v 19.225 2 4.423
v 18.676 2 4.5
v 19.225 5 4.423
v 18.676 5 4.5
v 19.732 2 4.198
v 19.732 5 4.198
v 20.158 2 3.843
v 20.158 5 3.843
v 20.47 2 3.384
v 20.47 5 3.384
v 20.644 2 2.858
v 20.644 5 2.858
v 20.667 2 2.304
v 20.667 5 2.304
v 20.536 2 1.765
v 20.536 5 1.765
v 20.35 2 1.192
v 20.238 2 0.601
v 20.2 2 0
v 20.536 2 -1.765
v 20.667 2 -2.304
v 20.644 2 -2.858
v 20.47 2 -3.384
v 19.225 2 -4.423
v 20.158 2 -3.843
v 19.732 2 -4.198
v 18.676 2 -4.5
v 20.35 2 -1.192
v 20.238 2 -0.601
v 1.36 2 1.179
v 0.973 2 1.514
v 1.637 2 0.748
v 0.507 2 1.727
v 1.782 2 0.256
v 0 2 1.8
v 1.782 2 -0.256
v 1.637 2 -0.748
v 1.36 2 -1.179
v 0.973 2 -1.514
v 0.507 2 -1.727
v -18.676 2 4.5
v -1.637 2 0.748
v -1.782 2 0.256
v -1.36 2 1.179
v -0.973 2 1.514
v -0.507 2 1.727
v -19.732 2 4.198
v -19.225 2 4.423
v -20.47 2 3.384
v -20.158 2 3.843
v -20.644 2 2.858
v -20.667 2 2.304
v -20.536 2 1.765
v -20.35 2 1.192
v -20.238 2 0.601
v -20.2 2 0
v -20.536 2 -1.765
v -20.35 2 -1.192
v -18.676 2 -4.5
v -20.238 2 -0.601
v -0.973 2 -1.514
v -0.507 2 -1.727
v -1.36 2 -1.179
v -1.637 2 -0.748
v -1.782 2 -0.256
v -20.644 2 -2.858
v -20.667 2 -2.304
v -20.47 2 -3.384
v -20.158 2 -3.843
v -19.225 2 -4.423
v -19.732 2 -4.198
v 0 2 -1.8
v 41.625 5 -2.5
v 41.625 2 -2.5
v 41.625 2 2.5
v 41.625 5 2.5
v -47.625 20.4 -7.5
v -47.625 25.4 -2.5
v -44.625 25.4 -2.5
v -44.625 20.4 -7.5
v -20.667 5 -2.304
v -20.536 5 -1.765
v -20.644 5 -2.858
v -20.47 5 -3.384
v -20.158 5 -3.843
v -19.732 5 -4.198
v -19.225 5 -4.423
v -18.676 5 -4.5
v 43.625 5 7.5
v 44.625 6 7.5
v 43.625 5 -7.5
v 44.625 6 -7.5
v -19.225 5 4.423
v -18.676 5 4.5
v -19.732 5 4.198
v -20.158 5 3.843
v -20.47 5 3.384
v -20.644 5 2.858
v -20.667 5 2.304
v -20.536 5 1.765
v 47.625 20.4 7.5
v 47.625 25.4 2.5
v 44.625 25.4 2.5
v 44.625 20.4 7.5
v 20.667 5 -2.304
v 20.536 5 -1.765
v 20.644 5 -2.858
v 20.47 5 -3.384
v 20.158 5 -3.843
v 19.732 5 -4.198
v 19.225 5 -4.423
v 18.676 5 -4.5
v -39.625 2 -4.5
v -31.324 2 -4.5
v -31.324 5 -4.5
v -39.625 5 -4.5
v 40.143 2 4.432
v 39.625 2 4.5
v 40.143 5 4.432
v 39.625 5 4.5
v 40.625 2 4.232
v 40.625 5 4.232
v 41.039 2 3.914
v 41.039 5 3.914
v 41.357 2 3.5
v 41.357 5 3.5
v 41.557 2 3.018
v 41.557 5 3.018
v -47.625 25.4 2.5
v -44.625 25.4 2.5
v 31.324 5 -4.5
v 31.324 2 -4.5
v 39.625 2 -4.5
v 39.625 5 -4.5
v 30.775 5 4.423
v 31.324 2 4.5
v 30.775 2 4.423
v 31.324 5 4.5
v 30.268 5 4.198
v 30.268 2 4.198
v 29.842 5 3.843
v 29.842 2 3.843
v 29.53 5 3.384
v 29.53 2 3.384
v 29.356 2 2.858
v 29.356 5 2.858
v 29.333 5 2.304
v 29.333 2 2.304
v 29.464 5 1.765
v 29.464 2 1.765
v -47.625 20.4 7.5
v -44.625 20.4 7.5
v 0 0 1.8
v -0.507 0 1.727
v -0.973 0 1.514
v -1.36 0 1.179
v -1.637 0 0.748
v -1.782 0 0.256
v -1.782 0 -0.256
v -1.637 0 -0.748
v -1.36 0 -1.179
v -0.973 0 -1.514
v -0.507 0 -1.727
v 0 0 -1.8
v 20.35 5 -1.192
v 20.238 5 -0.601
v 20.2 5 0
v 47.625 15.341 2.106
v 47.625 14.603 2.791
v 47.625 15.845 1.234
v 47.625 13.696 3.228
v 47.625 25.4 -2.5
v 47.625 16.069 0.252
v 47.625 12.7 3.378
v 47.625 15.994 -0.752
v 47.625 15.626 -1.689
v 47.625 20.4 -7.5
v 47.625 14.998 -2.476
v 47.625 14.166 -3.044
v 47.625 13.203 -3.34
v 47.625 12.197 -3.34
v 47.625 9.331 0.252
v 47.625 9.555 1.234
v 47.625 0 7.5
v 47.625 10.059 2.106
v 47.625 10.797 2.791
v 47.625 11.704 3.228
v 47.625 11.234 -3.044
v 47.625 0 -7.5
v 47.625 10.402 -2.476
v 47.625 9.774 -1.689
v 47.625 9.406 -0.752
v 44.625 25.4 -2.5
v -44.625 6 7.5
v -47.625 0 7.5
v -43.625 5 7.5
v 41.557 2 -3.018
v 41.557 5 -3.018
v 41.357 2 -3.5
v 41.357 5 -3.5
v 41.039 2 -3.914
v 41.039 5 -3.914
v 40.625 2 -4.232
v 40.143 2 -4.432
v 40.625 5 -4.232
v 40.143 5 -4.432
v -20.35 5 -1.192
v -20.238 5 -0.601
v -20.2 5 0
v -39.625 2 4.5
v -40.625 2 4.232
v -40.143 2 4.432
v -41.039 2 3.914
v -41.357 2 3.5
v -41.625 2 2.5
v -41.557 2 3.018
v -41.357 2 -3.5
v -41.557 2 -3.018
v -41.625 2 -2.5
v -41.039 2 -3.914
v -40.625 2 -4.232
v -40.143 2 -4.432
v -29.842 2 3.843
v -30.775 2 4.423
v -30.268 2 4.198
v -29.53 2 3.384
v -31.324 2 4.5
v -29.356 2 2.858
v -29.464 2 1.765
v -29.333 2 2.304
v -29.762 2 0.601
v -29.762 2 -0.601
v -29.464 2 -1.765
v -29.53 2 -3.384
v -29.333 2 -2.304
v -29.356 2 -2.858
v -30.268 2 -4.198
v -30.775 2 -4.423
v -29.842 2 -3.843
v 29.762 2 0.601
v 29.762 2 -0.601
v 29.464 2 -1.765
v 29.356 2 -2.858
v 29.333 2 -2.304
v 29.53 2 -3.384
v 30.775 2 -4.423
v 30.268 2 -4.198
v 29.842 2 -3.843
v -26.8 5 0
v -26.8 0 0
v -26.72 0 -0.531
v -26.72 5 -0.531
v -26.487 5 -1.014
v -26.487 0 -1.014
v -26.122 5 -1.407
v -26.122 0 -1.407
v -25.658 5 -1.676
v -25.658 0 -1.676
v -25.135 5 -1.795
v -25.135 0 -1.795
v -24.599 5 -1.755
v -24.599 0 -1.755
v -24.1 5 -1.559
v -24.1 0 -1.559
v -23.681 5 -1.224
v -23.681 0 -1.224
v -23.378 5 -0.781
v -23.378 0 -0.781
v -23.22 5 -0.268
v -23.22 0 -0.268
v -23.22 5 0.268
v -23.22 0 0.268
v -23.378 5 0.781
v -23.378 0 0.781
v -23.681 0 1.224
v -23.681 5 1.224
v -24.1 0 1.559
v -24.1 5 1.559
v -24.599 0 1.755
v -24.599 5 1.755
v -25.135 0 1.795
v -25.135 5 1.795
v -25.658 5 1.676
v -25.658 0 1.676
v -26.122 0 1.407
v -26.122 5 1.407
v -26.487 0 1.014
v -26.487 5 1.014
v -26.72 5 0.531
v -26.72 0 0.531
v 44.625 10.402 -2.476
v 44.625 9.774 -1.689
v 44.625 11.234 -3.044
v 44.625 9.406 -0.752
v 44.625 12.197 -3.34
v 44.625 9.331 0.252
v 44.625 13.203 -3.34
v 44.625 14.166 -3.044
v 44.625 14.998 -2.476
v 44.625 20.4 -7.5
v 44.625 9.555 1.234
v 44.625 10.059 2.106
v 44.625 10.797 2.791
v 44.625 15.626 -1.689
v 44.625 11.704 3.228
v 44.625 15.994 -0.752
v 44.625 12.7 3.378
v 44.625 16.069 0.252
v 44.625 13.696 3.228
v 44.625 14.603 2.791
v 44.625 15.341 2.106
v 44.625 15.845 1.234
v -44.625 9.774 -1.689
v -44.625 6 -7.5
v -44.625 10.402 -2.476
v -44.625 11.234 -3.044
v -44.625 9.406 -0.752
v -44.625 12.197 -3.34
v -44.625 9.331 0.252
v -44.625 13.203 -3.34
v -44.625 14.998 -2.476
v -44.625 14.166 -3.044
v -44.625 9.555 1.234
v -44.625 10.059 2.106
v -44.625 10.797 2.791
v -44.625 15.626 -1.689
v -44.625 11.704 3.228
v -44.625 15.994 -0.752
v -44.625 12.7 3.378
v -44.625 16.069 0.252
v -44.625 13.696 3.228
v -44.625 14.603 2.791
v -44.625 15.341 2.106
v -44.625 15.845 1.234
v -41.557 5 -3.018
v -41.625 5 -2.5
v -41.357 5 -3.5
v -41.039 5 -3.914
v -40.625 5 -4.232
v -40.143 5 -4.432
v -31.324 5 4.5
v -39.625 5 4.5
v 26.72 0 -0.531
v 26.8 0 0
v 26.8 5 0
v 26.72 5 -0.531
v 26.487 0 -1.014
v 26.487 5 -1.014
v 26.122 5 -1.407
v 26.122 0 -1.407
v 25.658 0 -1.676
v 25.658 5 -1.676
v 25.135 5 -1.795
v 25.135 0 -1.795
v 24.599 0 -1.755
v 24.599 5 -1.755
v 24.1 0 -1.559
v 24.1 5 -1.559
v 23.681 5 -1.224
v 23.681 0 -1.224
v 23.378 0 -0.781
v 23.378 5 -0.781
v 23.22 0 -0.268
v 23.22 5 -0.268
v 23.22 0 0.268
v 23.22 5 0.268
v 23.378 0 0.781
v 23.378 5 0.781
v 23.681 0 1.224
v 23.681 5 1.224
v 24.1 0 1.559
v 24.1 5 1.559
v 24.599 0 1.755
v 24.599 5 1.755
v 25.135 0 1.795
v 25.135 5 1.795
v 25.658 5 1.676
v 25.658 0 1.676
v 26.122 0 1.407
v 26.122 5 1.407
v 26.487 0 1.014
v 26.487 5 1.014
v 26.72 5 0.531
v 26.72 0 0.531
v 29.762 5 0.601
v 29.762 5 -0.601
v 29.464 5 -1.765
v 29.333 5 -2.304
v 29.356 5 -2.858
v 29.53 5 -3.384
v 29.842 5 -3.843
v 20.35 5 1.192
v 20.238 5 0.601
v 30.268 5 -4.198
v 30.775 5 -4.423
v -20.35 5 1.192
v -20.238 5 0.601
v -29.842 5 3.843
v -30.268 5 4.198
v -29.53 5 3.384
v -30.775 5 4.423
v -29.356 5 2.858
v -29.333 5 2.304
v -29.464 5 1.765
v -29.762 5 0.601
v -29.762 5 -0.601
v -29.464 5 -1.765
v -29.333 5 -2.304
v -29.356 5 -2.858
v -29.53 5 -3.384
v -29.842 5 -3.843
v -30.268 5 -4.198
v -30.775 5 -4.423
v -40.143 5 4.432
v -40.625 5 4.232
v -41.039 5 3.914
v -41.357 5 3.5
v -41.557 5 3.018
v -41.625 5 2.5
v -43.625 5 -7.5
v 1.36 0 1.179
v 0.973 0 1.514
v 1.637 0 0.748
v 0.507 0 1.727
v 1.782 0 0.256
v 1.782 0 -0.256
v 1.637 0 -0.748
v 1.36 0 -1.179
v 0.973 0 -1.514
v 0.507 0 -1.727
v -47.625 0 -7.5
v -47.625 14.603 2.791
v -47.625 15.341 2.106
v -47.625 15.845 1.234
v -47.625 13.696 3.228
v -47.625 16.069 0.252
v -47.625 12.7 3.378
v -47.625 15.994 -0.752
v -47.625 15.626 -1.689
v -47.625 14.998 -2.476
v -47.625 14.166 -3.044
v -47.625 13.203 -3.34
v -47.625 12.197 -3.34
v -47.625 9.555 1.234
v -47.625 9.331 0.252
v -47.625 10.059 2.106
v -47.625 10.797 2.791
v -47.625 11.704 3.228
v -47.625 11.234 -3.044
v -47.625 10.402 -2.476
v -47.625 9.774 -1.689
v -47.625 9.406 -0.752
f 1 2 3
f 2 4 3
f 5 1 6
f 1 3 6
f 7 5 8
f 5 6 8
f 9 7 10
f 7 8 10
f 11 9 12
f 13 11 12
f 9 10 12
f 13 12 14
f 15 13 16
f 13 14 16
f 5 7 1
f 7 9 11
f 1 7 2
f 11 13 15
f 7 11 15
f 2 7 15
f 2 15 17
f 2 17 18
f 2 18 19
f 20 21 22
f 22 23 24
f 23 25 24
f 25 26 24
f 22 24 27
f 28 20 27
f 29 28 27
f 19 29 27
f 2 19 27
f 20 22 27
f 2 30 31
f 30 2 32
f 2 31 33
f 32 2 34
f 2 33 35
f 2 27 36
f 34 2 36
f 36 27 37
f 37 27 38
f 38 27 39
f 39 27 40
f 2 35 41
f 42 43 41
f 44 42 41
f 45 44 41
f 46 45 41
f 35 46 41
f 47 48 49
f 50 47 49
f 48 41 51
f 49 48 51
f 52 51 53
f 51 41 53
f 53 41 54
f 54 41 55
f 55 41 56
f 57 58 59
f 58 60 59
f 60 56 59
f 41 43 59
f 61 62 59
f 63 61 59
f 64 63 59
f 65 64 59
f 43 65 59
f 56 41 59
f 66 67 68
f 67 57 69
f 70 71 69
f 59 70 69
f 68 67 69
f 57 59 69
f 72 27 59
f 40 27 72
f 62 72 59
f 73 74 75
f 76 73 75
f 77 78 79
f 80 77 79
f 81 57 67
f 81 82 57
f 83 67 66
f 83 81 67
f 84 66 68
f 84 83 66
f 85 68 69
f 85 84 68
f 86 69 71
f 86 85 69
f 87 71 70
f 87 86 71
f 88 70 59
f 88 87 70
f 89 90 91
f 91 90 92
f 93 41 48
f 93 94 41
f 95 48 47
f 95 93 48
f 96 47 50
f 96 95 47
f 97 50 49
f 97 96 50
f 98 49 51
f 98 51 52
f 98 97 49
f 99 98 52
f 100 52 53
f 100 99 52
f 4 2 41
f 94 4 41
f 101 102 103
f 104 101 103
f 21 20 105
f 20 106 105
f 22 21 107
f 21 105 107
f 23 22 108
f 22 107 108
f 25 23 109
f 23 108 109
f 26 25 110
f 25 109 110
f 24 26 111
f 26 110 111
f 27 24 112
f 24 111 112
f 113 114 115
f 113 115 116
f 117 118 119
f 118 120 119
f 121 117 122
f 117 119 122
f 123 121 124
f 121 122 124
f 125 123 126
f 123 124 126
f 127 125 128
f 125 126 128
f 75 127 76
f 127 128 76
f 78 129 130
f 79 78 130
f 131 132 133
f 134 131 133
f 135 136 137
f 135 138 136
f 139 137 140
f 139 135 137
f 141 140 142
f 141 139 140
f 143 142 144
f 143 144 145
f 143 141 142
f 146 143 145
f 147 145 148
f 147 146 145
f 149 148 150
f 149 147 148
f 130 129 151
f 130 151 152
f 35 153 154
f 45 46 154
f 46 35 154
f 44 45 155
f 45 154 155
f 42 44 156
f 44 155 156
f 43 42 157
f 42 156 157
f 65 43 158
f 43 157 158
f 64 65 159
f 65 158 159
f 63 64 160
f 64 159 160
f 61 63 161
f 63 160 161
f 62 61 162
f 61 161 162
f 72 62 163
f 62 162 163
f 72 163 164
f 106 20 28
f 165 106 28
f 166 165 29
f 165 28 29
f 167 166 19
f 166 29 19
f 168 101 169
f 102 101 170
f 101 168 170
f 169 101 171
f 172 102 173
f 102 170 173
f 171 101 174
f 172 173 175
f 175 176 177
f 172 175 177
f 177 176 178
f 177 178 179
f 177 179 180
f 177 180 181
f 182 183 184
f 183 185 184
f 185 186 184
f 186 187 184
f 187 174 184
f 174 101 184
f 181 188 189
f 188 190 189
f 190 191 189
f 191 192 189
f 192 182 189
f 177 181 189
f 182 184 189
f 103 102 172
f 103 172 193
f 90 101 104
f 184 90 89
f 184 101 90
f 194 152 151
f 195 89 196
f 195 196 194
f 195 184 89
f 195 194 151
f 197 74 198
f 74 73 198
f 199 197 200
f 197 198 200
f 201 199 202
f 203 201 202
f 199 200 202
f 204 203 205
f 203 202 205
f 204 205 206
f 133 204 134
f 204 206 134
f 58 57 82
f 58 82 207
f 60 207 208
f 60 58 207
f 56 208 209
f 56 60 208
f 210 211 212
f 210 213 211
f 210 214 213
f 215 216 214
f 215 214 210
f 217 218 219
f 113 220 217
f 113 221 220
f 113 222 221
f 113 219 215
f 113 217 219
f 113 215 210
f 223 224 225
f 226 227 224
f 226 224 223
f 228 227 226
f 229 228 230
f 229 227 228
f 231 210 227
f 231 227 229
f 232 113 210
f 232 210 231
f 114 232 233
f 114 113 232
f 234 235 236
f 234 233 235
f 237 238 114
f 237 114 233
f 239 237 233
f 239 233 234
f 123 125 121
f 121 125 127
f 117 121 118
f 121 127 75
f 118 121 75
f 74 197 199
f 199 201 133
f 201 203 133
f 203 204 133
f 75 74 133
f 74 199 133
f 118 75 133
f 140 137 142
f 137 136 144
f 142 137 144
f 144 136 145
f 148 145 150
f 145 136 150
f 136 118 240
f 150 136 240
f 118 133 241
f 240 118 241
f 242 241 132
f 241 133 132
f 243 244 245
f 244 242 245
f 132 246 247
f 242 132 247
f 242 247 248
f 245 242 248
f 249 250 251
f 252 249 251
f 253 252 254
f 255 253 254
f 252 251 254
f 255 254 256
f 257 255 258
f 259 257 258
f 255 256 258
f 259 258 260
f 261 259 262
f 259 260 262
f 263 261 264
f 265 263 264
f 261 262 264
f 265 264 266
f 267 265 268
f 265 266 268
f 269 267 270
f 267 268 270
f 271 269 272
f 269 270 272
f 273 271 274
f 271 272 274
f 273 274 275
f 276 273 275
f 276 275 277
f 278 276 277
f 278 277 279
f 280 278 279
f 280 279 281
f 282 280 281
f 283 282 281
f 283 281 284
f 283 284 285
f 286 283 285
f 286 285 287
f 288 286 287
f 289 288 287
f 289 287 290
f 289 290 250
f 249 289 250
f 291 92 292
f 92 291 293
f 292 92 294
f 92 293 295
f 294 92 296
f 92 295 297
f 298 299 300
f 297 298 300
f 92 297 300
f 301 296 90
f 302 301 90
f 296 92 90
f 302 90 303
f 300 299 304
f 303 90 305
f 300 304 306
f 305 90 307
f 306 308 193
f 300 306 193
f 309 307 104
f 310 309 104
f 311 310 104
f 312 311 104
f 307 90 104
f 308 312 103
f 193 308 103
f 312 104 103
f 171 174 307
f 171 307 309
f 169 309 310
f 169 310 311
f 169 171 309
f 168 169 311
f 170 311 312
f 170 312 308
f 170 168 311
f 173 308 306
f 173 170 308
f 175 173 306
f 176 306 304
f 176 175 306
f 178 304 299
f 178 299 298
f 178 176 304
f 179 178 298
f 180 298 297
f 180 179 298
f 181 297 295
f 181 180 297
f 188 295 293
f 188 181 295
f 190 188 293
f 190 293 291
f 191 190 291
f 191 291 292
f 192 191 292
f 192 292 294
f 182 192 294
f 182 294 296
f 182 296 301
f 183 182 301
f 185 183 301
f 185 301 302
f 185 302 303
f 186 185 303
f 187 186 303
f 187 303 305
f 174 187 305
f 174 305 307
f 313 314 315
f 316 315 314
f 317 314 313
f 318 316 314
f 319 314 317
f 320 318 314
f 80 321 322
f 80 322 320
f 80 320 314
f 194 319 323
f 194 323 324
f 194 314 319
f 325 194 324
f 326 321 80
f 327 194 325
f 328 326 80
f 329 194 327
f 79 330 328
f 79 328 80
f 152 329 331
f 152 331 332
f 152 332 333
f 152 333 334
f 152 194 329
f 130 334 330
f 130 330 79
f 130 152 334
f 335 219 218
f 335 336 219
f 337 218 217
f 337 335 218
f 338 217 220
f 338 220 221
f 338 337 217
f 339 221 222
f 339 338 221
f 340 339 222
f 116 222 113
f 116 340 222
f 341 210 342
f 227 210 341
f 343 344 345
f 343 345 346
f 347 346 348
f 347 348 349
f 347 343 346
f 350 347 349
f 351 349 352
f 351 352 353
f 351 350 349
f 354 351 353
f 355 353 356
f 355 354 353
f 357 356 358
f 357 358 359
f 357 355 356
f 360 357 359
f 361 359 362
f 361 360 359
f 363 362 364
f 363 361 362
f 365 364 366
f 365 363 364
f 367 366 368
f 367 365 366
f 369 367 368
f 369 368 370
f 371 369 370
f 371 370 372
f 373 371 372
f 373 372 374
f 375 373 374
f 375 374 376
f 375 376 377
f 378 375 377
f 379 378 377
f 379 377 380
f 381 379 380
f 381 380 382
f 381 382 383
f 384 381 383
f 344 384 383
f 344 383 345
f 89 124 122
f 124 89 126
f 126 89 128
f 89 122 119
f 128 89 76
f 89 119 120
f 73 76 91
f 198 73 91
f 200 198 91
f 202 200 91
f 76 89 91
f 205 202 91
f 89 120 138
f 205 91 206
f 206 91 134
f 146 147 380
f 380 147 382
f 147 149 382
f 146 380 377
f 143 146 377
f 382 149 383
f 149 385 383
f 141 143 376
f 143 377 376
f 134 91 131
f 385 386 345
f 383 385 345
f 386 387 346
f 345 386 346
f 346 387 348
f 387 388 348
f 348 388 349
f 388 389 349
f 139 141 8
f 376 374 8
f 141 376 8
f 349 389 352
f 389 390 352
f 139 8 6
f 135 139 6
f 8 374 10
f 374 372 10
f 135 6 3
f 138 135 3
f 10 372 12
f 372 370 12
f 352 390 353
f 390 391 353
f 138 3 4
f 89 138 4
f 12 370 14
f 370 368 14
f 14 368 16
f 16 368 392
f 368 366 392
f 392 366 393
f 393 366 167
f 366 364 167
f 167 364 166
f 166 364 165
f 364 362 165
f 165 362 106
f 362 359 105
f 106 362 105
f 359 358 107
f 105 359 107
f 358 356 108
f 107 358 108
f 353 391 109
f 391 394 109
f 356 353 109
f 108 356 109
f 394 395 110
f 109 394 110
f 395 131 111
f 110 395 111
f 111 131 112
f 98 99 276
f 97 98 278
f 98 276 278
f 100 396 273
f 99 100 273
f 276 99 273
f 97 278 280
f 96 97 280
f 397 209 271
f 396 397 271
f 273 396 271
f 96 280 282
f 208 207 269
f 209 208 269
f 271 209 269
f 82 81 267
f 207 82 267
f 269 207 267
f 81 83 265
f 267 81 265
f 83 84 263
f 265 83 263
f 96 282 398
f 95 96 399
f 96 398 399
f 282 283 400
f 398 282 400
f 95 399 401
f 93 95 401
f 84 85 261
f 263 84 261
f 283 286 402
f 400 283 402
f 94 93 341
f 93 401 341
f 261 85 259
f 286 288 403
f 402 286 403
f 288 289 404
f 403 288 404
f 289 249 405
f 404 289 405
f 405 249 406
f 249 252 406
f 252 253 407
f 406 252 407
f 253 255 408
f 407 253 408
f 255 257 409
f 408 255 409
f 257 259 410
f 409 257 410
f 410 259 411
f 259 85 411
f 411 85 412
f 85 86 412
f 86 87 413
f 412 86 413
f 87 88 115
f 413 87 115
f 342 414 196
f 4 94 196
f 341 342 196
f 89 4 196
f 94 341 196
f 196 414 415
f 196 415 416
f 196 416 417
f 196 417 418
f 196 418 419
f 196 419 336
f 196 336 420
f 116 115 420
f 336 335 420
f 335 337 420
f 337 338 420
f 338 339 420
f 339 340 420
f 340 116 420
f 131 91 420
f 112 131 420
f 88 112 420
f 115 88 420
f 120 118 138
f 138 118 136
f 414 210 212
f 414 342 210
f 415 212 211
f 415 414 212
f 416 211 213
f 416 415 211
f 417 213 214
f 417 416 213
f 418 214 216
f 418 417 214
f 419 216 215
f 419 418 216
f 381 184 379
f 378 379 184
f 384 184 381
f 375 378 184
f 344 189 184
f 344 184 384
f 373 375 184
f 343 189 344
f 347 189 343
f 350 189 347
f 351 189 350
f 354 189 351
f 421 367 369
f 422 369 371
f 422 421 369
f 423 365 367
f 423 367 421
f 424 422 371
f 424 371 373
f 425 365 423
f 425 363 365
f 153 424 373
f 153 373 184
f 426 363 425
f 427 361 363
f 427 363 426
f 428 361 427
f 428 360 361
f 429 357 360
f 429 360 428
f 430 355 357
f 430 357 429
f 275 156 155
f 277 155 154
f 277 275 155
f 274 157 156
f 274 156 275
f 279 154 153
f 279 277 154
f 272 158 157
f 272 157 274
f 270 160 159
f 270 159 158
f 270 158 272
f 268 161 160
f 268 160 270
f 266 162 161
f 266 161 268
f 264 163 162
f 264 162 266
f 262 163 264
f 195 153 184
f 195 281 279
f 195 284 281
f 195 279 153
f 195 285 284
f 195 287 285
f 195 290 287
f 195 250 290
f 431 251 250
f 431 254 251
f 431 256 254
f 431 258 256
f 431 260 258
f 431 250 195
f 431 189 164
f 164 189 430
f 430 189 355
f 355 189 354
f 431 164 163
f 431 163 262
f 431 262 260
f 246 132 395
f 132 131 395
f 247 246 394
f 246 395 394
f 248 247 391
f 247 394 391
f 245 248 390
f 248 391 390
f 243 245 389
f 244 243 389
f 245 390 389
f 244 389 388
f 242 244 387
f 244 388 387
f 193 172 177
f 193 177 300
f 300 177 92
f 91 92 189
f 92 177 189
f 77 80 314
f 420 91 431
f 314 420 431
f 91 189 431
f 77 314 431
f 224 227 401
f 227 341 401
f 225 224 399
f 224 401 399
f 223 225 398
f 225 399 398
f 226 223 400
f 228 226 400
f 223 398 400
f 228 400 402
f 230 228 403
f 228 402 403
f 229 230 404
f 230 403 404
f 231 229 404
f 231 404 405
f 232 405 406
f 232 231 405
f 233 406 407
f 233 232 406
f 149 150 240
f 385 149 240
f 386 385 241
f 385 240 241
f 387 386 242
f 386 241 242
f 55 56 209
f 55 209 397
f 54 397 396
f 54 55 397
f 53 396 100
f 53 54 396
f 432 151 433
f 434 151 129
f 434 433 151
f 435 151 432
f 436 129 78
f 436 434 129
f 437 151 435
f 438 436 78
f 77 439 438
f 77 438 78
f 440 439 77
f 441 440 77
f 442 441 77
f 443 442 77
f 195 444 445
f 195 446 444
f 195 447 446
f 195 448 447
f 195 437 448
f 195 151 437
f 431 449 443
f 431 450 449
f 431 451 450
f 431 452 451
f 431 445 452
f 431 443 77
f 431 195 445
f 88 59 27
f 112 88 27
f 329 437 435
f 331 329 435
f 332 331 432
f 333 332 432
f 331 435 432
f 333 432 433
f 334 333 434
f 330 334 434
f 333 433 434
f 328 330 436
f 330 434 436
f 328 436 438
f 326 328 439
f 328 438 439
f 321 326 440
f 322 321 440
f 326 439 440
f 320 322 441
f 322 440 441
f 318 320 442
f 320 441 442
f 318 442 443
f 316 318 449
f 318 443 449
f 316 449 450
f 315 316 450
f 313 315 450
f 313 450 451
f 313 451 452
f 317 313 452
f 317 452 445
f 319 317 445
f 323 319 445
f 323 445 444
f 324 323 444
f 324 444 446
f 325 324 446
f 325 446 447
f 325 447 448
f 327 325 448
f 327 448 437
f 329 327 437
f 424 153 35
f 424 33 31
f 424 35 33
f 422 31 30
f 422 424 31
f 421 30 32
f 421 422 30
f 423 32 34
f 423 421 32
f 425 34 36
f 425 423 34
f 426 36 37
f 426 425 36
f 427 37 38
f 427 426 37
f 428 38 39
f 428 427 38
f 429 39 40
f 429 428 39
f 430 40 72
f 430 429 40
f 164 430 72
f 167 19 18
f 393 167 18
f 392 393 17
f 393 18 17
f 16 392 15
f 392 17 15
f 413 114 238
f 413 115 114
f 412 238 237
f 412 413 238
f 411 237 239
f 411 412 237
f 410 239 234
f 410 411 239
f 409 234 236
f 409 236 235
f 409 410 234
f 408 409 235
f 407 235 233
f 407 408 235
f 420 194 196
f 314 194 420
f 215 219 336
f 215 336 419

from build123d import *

# Parameters (mm, degrees)
SKETCH1_W                   = 95.25
SKETCH1_H                   = 15
BOSS_EXTRUDE1_DEPTH         = 5
SKETCH2_W                   = 3
SKETCH2_H                   = 25.4
BOSS_EXTRUDE2_DEPTH         = 15
F_1_4_CLEARANCE_HOLE1_D     = 6.7564
F_1_4_CLEARANCE_HOLE1_DEPTH = 12
F_1_4_CLEARANCE_HOLE1_TIP   = 2.029827343
M3_CLEARANCE_HOLE1_D        = 3.6
M3_CLEARANCE_HOLE1_DEPTH    = 12
M3_CLEARANCE_HOLE1_TIP      = 1.081549114
CUT_EXTRUDE1_START          = -3
SKETCH9_R                   = 1.8
CUT_EXTRUDE1_DEPTH          = 3
FILLET1_R                   = 2
CHAMFER1_SIZE               = 1
CHAMFER2_SIZE               = 5
SKETCH10_W                  = 79.639400705
SKETCH10_H                  = 33.458041781
CUT_EXTRUDE2_DEPTH          = 57.020537529


with BuildPart() as part:
    # Sketch1 → Boss-Extrude1 (new body)
    with BuildSketch(Plane(origin=(0, 0, 0), x_dir=(1, 0, 0), z_dir=(0, 1, 0))):
        Rectangle(SKETCH1_W, SKETCH1_H)
    extrude(amount=BOSS_EXTRUDE1_DEPTH)

    # Sketch2 → Boss-Extrude2 (add, through all)
    with BuildSketch(Plane.XY.offset(7.5)):
        with Locations((-46.125, 12.7)):
            Rectangle(SKETCH2_W, SKETCH2_H)
    extrude(amount=-BOSS_EXTRUDE2_DEPTH)

    # 1/4 Clearance Hole1
    with Locations(Plane(origin=(-44.625, 0, 0), x_dir=(0, 0, -1), z_dir=(1, 0, 0))):
        with Locations((0, 12.7)):
            Hole(F_1_4_CLEARANCE_HOLE1_D / 2, depth=F_1_4_CLEARANCE_HOLE1_DEPTH)
            with Locations((0, 0, -(F_1_4_CLEARANCE_HOLE1_DEPTH + F_1_4_CLEARANCE_HOLE1_TIP / 2))):  # 118° drill point
                Cone(0, F_1_4_CLEARANCE_HOLE1_D / 2, F_1_4_CLEARANCE_HOLE1_TIP, mode=Mode.SUBTRACT)

    # M3 Clearance Hole1
    with Locations(Plane(origin=(0, 5, 0), x_dir=(1, 0, 0), z_dir=(0, 1, 0))):
        with Locations((-25, 0), (0, 0)):
            Hole(M3_CLEARANCE_HOLE1_D / 2, depth=M3_CLEARANCE_HOLE1_DEPTH)
            with Locations((0, 0, -(M3_CLEARANCE_HOLE1_DEPTH + M3_CLEARANCE_HOLE1_TIP / 2))):  # 118° drill point
                Cone(0, M3_CLEARANCE_HOLE1_D / 2, M3_CLEARANCE_HOLE1_TIP, mode=Mode.SUBTRACT)

    # Sketch9 → Cut-Extrude1 (cut)
    # profile 1 of 2: a face of its own
    with BuildSketch(Plane(origin=(0, 5, 0), x_dir=(1, 0, 0), z_dir=(0, 1, 0)).offset(CUT_EXTRUDE1_START)):
        with BuildLine():
            ThreePointArc((-26.670329309, -4.5), (-29.8, 0), (-26.670329309, 4.5))
            Line((-26.670329309, 4.5), (-41.625, 4.5))
            Line((-41.625, 4.5), (-41.625, -4.5))
            Line((-41.625, -4.5), (-26.670329309, -4.5))
        make_face()
    # profile 2 of 2: a face of its own
    with BuildSketch(Plane(origin=(0, 5, 0), x_dir=(1, 0, 0), z_dir=(0, 1, 0)).offset(CUT_EXTRUDE1_START)):
        with BuildLine():
            Line((44.625, -4.5), (44.625, 4.5))
            Line((44.625, 4.5), (-23.329670691, 4.5))
            ThreePointArc((-23.329670691, 4.5), (-21.059341382, 2.740658618), (-20.2, 0))
            ThreePointArc((-20.2, 0), (-21.059341382, -2.740658618), (-23.329670691, -4.5))
            Line((-23.329670691, -4.5), (44.625, -4.5))
        make_face()
        with Locations(Location((0, 0, 0), (0, 0, 270))):
            Circle(SKETCH9_R, mode=Mode.SUBTRACT)
    extrude(amount=CUT_EXTRUDE1_DEPTH, mode=Mode.SUBTRACT)

    # Fillet1
    fillet1_edges = [part.edges().sort_by_distance(p)[0] for p in [
        (-26.670329309, 3.5, -4.5),
        (-26.670329309, 3.5, 4.5),
        (-41.625, 3.5, 4.5),
        (-41.625, 3.5, -4.5),
        (-23.329670691, 3.5, 4.5),
        (-23.329670691, 3.5, -4.5),
    ]]
    fillet(fillet1_edges, radius=FILLET1_R)

    # Chamfer1
    chamfer1_edges = [part.edges().sort_by_distance(p)[0] for p in [
        (-44.625, 5, 0),
    ]]
    chamfer(chamfer1_edges, length=CHAMFER1_SIZE)

    # Chamfer2
    chamfer2_edges = [part.edges().sort_by_distance(p)[0] for p in [
        (-46.125, 25.4, 7.5),
        (-46.125, 25.4, -7.5),
    ]]
    chamfer(chamfer2_edges, length=CHAMFER2_SIZE)

    # Sketch10 → Cut-Extrude2 (cut, through all)
    with BuildSketch(Plane.XY.offset(7.5)):
        with Locations((39.819700352, 16.72902089)):
            Rectangle(SKETCH10_W, SKETCH10_H)
    extrude(amount=-CUT_EXTRUDE2_DEPTH, mode=Mode.SUBTRACT)

    # Mirror2: part across plane


with BuildPart() as part_1:
    add(part.part)
    add(part.part.mirror(Plane(origin=(0, 0, 0), x_dir=(0, 0, 1), z_dir=(1, 0, 0))))


solid = part_1.part
